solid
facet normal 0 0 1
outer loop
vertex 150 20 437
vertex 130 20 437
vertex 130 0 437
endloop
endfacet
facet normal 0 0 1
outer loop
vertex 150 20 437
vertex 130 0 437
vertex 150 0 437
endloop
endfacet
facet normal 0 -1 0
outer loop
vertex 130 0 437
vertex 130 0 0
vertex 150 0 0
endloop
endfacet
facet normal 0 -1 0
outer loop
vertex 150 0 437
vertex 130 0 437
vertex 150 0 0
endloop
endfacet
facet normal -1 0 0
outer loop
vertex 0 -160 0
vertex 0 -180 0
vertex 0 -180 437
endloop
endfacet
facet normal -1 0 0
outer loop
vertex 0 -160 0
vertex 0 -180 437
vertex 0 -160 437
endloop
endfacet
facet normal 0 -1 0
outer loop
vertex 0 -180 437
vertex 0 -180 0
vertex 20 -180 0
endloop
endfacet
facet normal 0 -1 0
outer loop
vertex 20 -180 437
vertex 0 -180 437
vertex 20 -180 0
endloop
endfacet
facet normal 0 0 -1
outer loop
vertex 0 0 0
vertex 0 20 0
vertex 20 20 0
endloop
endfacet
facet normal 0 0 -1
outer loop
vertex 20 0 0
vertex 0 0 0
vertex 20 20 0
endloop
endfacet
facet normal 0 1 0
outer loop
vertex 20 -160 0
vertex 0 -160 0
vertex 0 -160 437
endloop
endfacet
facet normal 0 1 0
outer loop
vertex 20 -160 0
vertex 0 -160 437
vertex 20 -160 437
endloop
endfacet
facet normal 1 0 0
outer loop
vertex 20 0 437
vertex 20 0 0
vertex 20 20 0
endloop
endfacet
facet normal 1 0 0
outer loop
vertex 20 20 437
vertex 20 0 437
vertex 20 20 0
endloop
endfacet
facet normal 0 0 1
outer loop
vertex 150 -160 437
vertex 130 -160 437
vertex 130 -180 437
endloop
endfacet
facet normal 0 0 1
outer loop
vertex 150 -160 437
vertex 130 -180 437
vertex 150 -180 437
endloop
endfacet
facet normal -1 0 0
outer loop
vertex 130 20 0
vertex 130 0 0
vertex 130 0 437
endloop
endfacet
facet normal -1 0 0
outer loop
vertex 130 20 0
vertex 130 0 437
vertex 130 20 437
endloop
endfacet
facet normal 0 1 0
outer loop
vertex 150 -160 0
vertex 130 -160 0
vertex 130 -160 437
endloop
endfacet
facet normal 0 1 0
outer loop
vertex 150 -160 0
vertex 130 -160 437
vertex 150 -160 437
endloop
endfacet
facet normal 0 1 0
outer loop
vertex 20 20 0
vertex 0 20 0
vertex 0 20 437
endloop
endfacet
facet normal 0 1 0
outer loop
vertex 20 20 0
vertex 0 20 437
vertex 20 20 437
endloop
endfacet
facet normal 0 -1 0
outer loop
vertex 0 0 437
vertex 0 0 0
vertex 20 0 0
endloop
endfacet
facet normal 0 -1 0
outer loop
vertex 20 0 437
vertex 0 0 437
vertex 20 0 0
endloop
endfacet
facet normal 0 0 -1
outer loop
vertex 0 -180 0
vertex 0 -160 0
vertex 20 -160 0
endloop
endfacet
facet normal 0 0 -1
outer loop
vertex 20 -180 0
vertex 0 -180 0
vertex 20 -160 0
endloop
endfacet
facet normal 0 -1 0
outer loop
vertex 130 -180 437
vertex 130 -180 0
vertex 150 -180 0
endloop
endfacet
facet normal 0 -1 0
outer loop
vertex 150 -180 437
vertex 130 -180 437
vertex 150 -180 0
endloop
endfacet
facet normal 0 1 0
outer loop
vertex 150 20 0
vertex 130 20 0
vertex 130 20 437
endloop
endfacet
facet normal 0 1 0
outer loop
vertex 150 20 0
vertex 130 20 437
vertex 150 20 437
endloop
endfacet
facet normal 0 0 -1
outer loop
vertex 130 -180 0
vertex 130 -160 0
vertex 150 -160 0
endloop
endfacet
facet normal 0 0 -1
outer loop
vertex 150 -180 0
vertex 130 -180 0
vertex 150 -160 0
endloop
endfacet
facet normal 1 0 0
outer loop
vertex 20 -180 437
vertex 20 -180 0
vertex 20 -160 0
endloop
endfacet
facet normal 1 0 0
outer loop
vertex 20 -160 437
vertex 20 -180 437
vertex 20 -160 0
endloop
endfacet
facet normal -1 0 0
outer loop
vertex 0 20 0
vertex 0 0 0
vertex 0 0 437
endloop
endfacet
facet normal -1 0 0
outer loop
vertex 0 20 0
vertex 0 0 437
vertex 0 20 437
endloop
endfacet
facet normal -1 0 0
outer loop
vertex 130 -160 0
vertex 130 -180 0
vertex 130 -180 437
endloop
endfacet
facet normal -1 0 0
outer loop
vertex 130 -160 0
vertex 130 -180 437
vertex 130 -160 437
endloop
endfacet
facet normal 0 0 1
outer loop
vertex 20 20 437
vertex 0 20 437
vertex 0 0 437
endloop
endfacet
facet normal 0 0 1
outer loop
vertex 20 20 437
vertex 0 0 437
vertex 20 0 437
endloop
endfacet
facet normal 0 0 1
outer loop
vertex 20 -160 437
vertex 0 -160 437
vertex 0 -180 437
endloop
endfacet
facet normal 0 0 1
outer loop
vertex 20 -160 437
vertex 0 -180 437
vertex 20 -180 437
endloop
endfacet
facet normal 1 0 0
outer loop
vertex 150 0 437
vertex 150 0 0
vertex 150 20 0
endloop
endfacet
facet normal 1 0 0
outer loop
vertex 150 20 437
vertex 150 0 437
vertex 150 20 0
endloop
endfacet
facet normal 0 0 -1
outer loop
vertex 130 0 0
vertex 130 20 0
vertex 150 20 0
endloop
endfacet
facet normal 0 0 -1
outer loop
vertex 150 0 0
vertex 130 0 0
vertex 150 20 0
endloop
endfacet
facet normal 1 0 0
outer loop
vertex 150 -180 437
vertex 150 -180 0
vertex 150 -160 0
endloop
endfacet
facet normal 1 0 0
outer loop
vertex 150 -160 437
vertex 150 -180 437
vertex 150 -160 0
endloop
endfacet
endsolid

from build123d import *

# Parameters (mm, degrees)
SKETCH1_W             = 20
SKETCH1_H             = 20
BOSS_EXTRUDE1_DEPTH   = 437
BOSS_EXTRUDE1_2_DEPTH = 437
BOSS_EXTRUDE1_3_DEPTH = 437
BOSS_EXTRUDE1_4_DEPTH = 437


with BuildPart() as part:
    # Sketch1 → Boss-Extrude1 (new body)
    with BuildSketch(Plane.XY):
        with Locations((10, 10)):
            Rectangle(SKETCH1_W, SKETCH1_H)
    extrude(amount=BOSS_EXTRUDE1_DEPTH)


with BuildPart() as body_2:
    # Sketch1 → Boss-Extrude1 2 (new body)
    with BuildSketch(Plane.XY):
        with Locations((140, 10)):
            Rectangle(SKETCH1_W, SKETCH1_H)
    extrude(amount=BOSS_EXTRUDE1_2_DEPTH)


with BuildPart() as body_3:
    # Sketch1 → Boss-Extrude1 3 (new body)
    with BuildSketch(Plane.XY):
        with Locations((140, -170)):
            Rectangle(SKETCH1_W, SKETCH1_H)
    extrude(amount=BOSS_EXTRUDE1_3_DEPTH)


with BuildPart() as body_4:
    # Sketch1 → Boss-Extrude1 4 (new body)
    with BuildSketch(Plane.XY):
        with Locations((10, -170)):
            Rectangle(SKETCH1_W, SKETCH1_H)
    extrude(amount=BOSS_EXTRUDE1_4_DEPTH)


solid = Compound([part.part, body_2.part, body_3.part, body_4.part])
